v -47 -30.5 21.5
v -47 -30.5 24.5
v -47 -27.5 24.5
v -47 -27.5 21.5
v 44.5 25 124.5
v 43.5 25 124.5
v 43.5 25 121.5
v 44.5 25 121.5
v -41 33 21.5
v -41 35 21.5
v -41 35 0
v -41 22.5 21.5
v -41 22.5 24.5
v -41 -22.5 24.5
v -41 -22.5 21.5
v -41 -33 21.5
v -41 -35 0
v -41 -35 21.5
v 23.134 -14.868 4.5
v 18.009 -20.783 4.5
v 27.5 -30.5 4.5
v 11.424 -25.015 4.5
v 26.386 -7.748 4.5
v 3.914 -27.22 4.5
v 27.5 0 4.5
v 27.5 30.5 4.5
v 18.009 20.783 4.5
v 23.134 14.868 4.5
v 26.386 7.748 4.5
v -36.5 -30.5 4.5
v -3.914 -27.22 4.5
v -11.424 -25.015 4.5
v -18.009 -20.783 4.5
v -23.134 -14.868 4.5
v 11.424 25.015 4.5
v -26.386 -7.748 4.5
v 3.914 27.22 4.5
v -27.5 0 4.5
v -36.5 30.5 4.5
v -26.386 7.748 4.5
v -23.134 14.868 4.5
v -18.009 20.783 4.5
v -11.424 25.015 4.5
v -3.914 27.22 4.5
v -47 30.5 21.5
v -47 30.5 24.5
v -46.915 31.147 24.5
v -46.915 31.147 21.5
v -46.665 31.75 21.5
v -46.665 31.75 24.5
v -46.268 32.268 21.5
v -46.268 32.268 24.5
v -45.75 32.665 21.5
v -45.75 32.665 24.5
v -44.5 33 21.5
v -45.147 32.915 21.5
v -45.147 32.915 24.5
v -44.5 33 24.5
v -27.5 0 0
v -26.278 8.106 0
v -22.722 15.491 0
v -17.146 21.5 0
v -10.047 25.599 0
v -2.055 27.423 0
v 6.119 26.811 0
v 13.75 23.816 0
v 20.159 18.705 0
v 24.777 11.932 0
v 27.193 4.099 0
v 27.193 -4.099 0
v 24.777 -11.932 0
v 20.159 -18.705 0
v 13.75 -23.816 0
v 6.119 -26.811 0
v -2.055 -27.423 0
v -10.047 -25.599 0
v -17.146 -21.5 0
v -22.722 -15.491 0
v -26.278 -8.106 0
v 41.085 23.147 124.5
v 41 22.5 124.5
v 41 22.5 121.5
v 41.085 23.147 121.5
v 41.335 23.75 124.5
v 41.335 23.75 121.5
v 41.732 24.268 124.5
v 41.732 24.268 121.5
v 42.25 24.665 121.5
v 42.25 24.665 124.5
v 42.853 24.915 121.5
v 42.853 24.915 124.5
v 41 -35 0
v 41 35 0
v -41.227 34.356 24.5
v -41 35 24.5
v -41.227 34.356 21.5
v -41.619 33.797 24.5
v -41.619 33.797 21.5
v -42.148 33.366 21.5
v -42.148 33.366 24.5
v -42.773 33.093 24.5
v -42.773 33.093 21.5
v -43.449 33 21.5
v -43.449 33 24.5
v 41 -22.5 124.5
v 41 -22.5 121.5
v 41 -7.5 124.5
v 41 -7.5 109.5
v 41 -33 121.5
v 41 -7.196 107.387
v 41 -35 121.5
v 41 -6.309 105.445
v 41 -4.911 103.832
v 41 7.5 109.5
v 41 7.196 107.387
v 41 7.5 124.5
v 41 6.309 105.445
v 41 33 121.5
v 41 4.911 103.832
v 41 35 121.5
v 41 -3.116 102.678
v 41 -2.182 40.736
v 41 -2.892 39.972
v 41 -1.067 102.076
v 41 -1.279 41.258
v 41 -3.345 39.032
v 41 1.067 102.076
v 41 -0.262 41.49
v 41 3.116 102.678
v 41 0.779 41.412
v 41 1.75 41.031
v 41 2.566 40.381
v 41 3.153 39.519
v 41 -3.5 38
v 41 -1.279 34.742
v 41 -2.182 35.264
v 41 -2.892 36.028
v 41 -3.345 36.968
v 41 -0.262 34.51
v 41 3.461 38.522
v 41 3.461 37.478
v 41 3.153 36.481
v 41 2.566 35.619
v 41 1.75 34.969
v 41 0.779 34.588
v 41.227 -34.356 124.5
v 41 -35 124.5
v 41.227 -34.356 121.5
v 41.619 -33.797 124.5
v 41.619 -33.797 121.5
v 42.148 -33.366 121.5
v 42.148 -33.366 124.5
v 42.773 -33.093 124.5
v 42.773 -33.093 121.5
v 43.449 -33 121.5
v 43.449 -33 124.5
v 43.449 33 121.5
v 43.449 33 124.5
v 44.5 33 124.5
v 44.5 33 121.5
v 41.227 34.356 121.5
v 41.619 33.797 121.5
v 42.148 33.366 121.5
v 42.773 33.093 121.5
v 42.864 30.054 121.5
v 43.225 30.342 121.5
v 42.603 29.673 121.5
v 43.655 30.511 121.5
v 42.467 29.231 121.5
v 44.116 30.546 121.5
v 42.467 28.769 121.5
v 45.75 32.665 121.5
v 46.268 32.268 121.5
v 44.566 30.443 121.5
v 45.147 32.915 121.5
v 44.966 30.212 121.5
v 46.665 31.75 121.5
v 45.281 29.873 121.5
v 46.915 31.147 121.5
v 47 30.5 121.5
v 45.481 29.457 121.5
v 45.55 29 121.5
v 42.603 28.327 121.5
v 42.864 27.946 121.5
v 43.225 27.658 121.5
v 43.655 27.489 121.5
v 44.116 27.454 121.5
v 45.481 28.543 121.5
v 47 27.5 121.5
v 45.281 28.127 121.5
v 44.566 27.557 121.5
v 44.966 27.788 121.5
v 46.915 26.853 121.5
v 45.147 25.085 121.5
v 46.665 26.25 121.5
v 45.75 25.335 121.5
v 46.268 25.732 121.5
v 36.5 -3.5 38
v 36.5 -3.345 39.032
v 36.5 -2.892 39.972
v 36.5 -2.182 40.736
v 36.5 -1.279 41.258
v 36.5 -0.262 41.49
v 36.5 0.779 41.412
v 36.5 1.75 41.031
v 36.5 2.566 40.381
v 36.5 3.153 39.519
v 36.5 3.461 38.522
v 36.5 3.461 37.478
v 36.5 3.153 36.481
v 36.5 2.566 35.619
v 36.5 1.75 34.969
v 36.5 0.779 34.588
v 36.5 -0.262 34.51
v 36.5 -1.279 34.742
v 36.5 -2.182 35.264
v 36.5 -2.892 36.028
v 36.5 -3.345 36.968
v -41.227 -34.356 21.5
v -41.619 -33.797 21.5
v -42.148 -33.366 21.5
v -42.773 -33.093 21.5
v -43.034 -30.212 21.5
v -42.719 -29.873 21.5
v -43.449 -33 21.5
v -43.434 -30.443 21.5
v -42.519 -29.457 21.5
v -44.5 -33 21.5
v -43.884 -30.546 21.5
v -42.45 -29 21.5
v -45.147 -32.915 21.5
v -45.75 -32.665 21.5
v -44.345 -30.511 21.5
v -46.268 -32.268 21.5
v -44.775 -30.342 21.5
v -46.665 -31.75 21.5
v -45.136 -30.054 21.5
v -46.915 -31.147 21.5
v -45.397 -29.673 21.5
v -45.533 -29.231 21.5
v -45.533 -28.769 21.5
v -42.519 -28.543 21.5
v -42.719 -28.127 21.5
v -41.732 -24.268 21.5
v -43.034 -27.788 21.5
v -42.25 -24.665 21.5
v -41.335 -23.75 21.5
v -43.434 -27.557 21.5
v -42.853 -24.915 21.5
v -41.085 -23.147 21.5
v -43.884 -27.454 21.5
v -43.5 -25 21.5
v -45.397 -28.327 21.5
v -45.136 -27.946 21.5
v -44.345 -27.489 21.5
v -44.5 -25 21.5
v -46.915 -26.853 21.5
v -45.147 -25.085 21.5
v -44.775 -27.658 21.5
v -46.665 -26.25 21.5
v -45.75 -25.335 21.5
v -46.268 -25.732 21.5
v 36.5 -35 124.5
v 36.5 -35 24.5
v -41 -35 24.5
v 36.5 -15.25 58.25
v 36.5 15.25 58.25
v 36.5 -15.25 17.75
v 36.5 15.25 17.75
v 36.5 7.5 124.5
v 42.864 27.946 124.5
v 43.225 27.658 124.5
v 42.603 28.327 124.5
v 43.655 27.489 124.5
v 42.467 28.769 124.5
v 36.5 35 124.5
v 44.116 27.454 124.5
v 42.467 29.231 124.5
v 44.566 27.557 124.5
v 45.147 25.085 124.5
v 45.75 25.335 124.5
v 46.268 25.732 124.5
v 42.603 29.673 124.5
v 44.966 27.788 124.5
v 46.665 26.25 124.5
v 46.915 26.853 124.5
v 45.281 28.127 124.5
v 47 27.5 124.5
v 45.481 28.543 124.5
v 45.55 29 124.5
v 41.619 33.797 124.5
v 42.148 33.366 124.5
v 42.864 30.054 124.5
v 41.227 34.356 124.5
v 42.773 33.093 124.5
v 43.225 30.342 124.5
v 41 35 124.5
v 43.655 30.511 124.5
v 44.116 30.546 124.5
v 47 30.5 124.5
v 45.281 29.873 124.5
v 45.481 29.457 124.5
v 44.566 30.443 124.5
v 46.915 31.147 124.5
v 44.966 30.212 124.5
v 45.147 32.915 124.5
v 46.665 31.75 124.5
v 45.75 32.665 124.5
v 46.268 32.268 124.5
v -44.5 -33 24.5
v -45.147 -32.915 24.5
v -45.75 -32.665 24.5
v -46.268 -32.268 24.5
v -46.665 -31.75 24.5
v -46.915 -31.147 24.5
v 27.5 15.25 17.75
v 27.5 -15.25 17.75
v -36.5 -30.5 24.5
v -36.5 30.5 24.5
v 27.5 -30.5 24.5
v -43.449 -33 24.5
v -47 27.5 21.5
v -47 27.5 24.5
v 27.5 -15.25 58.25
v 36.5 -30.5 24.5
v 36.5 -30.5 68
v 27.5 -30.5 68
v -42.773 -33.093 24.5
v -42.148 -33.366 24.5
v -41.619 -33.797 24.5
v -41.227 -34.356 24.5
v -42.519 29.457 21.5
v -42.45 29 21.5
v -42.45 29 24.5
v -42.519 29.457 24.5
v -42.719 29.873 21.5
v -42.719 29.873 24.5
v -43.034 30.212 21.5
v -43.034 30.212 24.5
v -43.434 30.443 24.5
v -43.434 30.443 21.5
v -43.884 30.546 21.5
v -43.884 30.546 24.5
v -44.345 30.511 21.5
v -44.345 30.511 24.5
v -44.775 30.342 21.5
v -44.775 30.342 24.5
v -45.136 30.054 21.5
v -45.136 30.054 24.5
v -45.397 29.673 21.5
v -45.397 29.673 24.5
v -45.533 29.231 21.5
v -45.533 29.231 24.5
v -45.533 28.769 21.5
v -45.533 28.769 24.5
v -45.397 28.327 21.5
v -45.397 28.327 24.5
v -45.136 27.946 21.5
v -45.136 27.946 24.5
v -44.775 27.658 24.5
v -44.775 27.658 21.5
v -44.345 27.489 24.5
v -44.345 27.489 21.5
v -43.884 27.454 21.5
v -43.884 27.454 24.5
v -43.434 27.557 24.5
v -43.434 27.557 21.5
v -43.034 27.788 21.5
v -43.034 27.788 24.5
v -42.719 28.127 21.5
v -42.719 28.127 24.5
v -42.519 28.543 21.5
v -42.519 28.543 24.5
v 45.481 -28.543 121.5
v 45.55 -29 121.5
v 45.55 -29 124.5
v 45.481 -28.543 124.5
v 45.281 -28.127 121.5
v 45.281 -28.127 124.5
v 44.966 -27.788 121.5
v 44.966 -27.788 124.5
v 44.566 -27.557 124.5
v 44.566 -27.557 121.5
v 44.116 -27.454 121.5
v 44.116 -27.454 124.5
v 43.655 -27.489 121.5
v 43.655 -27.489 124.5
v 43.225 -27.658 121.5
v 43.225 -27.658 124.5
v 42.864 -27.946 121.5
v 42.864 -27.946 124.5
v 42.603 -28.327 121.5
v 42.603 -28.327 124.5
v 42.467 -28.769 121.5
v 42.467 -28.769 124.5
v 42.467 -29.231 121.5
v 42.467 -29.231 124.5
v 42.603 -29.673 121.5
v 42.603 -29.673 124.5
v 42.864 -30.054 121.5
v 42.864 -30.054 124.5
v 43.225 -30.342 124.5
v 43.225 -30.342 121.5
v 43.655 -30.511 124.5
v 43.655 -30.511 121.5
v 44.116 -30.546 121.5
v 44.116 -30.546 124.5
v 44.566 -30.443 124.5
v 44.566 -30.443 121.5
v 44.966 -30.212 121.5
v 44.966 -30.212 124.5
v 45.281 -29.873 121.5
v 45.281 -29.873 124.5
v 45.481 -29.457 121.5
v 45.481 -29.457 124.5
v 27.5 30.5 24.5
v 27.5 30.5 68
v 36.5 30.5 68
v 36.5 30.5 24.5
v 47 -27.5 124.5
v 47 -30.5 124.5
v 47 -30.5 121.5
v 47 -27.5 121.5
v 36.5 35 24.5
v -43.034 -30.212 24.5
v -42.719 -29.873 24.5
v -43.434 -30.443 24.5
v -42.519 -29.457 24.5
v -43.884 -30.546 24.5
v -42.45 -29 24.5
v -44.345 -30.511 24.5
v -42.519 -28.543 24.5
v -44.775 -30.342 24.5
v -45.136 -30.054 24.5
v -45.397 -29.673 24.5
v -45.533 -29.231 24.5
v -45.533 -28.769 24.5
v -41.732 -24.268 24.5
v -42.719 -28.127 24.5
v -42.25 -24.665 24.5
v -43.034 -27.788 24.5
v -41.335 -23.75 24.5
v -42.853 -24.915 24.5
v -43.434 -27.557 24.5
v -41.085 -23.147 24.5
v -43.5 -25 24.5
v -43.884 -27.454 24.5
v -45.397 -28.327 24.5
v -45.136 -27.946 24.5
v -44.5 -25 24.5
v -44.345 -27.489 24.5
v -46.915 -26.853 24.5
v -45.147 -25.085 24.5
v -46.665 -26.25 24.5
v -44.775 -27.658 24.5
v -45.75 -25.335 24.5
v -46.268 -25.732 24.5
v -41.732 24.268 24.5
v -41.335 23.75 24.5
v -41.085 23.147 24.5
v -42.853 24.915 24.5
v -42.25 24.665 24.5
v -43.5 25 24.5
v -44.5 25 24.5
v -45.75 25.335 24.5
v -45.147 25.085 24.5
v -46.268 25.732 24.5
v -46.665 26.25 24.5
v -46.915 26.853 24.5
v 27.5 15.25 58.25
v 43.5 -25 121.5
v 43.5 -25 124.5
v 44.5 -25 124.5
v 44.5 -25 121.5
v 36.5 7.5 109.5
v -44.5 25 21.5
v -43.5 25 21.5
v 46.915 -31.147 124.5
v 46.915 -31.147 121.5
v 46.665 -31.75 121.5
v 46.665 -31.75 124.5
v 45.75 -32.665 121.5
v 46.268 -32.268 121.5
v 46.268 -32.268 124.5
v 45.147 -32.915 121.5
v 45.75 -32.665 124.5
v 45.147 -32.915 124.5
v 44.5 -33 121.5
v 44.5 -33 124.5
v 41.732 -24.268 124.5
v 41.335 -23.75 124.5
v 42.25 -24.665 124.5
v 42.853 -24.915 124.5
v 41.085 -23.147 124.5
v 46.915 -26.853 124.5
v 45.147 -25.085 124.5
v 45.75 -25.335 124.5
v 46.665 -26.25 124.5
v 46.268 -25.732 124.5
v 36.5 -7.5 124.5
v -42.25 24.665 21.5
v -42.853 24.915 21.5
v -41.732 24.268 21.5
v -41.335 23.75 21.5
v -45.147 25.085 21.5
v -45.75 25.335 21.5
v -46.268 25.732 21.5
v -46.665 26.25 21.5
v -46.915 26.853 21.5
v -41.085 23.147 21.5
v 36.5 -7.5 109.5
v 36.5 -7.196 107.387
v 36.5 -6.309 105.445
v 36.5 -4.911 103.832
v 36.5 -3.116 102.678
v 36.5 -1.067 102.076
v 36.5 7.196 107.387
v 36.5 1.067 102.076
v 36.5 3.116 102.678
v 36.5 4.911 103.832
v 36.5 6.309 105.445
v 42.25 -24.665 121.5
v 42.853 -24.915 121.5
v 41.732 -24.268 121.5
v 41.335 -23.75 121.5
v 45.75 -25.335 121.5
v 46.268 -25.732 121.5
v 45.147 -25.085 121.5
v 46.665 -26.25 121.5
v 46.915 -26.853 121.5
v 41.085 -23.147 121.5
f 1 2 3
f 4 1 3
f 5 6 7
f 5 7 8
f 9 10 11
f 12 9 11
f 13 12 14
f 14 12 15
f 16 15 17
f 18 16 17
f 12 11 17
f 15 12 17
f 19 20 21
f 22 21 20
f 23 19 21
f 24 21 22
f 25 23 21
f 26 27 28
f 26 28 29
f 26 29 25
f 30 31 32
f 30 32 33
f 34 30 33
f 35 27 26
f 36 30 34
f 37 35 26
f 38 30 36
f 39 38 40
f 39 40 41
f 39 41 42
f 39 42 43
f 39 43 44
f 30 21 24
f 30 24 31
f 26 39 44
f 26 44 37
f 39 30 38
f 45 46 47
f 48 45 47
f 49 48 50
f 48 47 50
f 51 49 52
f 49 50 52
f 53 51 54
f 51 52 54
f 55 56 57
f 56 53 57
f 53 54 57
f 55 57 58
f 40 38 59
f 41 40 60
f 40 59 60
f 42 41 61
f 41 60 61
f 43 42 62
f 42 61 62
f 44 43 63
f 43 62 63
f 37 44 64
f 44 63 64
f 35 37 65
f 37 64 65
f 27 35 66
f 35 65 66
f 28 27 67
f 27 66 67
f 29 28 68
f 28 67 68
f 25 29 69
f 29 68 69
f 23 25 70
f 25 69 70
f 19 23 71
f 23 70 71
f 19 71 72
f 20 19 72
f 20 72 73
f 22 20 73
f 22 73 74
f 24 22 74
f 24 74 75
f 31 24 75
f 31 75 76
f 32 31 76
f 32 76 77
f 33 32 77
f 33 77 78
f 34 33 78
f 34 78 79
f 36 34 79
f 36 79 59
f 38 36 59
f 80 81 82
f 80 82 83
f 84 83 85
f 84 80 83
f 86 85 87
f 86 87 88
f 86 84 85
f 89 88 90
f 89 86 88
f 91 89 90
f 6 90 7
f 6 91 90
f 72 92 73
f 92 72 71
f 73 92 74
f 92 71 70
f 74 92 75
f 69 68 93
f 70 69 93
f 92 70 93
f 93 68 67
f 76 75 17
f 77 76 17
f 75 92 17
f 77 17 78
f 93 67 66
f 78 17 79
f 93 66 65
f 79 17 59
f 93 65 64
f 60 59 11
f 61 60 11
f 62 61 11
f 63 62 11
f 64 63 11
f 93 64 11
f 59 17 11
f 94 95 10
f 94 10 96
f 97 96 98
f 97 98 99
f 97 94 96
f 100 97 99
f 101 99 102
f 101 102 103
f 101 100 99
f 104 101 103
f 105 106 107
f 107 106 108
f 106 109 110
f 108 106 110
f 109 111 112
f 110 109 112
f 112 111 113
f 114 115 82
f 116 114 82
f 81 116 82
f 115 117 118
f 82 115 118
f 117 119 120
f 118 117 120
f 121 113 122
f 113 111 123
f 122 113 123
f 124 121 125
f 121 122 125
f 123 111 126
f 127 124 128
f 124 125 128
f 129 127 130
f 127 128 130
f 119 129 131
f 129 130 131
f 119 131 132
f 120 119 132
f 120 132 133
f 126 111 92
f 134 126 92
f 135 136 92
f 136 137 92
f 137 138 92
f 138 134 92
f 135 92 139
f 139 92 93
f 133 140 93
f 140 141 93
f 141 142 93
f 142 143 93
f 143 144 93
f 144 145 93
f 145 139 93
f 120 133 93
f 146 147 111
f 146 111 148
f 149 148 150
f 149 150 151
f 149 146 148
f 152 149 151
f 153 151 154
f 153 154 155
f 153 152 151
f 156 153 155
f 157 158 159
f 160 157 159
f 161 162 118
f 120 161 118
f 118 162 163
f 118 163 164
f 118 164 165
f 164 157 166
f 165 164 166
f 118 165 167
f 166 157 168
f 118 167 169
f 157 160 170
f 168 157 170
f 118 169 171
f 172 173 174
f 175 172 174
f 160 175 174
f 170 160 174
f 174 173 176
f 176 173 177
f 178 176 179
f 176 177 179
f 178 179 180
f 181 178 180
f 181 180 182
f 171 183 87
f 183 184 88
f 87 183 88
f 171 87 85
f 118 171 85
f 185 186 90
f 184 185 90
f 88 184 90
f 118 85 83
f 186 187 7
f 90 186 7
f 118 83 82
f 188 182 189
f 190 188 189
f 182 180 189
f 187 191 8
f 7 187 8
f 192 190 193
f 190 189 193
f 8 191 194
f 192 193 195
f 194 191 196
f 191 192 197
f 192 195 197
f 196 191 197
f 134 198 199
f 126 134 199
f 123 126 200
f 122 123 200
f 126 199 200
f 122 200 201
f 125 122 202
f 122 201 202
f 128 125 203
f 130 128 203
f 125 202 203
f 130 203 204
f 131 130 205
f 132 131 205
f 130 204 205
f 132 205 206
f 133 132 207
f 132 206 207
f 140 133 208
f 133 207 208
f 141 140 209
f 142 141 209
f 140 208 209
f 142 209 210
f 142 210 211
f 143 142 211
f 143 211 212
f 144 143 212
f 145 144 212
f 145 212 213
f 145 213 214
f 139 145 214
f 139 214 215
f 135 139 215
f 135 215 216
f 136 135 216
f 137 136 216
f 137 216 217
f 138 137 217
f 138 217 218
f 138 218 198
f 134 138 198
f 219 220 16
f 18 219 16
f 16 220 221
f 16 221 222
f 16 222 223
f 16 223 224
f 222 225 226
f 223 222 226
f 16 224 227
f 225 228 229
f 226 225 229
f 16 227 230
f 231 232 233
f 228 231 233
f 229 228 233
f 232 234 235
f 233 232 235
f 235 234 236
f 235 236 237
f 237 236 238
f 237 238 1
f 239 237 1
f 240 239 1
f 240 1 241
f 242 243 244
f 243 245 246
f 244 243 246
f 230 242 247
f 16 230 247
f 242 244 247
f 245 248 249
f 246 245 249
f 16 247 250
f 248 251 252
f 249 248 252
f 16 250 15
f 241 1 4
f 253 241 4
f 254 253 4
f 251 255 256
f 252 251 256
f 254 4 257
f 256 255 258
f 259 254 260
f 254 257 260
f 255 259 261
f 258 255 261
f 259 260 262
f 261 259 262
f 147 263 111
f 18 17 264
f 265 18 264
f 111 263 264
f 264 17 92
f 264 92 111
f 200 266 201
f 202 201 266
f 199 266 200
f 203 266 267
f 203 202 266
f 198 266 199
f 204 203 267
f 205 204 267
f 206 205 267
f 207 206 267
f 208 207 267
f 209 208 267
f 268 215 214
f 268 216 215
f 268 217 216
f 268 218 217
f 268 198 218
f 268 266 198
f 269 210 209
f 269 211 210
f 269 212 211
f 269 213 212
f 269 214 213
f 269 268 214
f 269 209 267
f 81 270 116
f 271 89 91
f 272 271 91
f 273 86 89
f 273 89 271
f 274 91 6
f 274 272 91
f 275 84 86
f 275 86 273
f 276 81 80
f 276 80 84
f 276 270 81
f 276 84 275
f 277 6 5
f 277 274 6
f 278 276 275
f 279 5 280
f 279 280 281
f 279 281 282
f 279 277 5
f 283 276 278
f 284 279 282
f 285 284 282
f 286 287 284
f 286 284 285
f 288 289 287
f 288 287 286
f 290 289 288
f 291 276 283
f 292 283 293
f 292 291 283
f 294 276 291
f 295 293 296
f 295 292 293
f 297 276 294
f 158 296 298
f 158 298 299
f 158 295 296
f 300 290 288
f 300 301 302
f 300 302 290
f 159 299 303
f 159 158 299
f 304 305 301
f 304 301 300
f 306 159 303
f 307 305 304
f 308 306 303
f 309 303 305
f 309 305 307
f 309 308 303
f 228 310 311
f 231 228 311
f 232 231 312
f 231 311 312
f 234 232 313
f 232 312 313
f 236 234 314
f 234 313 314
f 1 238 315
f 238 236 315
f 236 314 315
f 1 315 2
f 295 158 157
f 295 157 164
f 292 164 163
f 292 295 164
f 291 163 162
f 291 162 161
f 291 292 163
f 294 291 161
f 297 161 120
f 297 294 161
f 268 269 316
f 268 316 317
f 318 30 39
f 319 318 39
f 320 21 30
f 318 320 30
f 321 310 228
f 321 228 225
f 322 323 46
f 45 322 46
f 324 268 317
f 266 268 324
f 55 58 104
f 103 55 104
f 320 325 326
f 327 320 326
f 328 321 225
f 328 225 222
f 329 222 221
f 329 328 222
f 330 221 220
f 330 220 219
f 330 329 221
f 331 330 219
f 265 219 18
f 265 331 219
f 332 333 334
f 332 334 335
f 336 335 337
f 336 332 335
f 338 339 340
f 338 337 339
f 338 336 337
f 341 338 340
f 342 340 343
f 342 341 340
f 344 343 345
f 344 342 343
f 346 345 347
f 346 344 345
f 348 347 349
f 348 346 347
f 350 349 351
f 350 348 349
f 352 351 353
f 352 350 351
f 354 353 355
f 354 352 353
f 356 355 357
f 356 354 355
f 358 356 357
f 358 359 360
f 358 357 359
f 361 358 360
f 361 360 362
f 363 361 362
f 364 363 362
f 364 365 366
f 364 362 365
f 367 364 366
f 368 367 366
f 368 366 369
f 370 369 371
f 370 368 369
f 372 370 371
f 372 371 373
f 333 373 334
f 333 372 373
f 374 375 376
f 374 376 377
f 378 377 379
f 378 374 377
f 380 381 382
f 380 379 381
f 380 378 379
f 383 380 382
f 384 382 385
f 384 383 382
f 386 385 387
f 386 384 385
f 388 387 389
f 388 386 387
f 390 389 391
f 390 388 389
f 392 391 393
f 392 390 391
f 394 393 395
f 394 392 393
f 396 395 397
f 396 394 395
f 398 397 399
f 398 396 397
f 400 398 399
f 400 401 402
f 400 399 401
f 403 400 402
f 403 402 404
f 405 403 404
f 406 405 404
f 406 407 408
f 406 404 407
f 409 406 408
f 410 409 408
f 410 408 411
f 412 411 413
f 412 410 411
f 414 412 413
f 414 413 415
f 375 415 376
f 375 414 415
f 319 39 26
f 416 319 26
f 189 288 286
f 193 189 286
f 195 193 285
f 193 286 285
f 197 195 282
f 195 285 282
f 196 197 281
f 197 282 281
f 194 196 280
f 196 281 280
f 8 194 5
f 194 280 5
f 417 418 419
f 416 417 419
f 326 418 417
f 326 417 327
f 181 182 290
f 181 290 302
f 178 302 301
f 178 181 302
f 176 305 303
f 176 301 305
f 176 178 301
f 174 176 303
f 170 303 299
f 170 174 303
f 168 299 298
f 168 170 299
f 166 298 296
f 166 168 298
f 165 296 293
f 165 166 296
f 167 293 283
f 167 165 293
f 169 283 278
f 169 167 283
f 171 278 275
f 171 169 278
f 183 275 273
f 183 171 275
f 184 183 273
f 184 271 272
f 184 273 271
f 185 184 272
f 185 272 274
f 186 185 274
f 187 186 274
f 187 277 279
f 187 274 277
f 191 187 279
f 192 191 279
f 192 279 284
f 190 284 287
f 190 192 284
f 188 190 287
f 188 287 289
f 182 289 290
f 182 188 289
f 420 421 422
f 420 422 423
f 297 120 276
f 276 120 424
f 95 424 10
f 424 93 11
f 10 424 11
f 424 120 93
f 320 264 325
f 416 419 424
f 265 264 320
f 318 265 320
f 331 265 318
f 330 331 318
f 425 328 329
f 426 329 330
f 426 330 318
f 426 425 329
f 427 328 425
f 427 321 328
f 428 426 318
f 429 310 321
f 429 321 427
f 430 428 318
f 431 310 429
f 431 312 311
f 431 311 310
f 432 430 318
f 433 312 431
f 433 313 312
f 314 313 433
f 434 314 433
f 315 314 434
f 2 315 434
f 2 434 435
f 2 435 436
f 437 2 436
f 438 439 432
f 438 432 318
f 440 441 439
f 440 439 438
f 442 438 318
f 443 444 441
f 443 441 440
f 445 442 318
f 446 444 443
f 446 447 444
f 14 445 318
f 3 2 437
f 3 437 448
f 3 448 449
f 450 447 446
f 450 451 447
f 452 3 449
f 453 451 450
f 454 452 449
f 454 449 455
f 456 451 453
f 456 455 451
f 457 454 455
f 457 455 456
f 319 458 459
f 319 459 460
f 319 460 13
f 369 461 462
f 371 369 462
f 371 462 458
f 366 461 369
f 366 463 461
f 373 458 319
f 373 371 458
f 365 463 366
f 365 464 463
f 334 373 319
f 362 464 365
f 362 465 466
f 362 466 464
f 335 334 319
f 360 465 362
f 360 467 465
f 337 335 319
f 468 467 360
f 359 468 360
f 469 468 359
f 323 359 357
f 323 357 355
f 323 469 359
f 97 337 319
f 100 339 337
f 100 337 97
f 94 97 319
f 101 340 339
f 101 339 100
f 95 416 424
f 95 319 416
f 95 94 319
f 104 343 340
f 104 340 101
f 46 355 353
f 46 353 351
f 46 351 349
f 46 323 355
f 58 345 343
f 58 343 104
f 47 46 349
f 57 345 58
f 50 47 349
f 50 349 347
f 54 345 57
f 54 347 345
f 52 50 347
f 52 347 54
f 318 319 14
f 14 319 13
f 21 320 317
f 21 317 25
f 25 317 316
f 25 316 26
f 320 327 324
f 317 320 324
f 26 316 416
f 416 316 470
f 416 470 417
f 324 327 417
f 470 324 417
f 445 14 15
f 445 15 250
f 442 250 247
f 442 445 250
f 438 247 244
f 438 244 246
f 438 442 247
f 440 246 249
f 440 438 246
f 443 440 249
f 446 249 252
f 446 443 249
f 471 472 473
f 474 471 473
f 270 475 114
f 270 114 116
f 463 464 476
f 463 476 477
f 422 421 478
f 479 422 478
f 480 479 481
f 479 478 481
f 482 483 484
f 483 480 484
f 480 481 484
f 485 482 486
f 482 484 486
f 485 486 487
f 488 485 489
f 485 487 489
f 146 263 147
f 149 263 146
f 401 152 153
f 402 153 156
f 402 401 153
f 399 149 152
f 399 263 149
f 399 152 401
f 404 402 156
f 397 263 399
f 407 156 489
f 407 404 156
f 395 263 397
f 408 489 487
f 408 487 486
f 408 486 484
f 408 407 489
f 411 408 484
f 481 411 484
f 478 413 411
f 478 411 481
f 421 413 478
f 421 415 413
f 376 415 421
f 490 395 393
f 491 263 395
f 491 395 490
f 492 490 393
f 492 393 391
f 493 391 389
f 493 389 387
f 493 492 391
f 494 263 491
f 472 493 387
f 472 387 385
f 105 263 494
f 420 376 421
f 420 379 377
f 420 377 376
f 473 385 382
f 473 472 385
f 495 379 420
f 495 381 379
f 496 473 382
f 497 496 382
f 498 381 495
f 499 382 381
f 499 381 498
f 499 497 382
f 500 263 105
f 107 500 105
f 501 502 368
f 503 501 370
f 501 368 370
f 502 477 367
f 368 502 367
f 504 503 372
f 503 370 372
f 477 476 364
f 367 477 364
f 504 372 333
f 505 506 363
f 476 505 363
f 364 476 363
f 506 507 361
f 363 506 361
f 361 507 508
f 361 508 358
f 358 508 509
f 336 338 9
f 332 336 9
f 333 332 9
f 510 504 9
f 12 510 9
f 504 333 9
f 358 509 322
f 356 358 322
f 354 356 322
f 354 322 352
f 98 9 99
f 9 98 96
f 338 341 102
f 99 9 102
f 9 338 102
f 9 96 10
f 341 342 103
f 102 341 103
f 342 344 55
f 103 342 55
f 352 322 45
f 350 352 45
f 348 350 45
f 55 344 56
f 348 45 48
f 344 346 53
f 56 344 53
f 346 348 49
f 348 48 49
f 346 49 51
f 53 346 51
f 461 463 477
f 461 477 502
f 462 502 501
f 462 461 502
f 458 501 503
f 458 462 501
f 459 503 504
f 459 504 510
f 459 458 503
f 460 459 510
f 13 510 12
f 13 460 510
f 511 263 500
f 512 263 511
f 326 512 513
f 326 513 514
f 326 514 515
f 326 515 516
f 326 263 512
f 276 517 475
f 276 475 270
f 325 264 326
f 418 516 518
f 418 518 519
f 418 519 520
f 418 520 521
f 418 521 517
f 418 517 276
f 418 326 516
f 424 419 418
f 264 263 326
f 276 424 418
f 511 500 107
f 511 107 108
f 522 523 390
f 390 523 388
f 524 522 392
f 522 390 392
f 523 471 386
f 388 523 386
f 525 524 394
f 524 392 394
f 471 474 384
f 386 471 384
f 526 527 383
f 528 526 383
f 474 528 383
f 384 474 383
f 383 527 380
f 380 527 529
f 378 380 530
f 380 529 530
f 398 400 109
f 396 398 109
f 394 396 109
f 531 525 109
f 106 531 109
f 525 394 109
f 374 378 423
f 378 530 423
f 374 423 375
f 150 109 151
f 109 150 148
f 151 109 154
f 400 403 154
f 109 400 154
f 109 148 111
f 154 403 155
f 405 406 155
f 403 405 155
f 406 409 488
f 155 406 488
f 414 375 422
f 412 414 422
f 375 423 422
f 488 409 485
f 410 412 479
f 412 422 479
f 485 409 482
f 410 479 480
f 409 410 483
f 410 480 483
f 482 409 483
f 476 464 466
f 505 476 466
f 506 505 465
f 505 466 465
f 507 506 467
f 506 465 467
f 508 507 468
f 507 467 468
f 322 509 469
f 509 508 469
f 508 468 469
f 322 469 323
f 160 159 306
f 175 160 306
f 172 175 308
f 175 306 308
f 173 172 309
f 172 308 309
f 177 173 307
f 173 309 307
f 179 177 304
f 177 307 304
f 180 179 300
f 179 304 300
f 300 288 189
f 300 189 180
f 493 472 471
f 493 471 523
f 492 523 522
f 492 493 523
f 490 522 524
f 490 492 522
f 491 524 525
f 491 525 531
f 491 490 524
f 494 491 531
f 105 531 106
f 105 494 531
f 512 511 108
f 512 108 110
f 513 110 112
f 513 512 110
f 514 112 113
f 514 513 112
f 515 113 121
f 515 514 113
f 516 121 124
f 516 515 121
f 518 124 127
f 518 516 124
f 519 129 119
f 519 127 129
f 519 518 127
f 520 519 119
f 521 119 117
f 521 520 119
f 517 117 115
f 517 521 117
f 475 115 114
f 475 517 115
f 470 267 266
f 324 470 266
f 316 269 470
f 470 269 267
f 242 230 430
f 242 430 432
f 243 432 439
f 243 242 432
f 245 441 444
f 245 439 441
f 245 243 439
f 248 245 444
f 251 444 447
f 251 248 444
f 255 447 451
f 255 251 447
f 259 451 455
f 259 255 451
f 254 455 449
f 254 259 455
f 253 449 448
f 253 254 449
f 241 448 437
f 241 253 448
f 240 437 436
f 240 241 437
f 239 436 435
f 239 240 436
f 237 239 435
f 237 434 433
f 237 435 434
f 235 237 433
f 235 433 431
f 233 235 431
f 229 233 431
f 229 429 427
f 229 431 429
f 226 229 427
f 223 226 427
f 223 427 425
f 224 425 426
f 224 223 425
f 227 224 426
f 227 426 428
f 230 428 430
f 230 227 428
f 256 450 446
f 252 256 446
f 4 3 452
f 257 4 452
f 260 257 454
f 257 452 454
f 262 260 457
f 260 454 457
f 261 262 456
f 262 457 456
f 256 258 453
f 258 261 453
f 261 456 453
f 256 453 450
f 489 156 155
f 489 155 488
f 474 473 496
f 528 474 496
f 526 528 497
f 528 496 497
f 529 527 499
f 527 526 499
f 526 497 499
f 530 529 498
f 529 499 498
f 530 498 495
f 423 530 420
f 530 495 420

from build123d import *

# Parameters (mm, degrees)
SKETCH1_W               = 70
SKETCH1_H               = 82
BOSS_EXTRUDE1_DEPTH     = 4.5
SKETCH2_W               = 4.5
SKETCH2_H               = 70
BOSS_EXTRUDE2_DEPTH     = 120
BOSS_EXTRUDE3_DEPTH     = 20
CUT_EXTRUDE1_REACH      = 137.67
SKETCH4_R               = 27.5
CUT_EXTRUDE2_REACH      = 152.77
SKETCH5_R               = 3.5
SKETCH6_W               = 6
SKETCH6_H               = 8
BOSS_EXTRUDE4_DEPTH     = 3
SKETCH7_W               = 6
SKETCH7_H               = 8
BOSS_EXTRUDE5_DEPTH     = 3
CUT_EXTRUDE4_DEPTH      = 116.905133622
CUT_EXTRUDE4_DEPTH_BACK = 116.905133622
SKETCH8_R               = 1.55
FILLET1_R               = 2.5
SKETCH9_W               = 30.5
SKETCH9_H               = 40.5
BOSS_EXTRUDE6_DEPTH     = 9


with BuildPart() as part:
    # Sketch1 → Boss-Extrude1 (new body)
    with BuildSketch(Plane(origin=(0, 0, 0), x_dir=(0, 1, 0), z_dir=(0, 0, 1))):
        Rectangle(SKETCH1_W, SKETCH1_H)
    extrude(amount=BOSS_EXTRUDE1_DEPTH)

    # Sketch2 → Boss-Extrude2 (add)
    with BuildSketch(Plane.XY.offset(4.5)):
        with Locations((38.75, 0)):
            Rectangle(SKETCH2_W, SKETCH2_H)
    extrude(amount=BOSS_EXTRUDE2_DEPTH)

    # Sketch3 → Boss-Extrude3 (add)
    with BuildSketch(Plane.XY.offset(4.5)):
        Polygon((36.5, 35), (-41, 35), (-41, -35), (36.5, -35), (36.5, -30.5), (-36.5, -30.5), (-36.5, 30.5), (36.5, 30.5), align=None)
    extrude(amount=BOSS_EXTRUDE3_DEPTH)

    # Sketch4 → Cut-Extrude1 (cut, up to next)
    with BuildSketch(Plane(origin=(0, 0, 0), x_dir=(1, 0, 0), z_dir=(0, 0, -1)), mode=Mode.PRIVATE) as cut_extrude1_sk1:
        with Locations(Location((0, 0, 0), (0, 0, 180))):
            Circle(SKETCH4_R)
    cut_extrude1_tool1 = extrude(cut_extrude1_sk1.sketch, amount=-CUT_EXTRUDE1_REACH, mode=Mode.PRIVATE) & part.part
    add(cut_extrude1_tool1.solids().sort_by_distance((0, 0, 0))[0], mode=Mode.SUBTRACT)

    # Sketch5 → Cut-Extrude2 (cut, up to next)
    with BuildSketch(Plane(origin=(36.5, 0, 0), x_dir=(0, -1, 0), z_dir=(-1, 0, 0)), mode=Mode.PRIVATE) as cut_extrude2_sk1:
        with Locations((0, 38)):
            Circle(SKETCH5_R)
    cut_extrude2_tool1 = extrude(cut_extrude2_sk1.sketch, amount=-CUT_EXTRUDE2_REACH, mode=Mode.PRIVATE) & part.part
    # Sketch5 → Cut-Extrude2 (cut, up to next)
    with BuildSketch(Plane(origin=(36.5, 0, 0), x_dir=(0, -1, 0), z_dir=(-1, 0, 0)), mode=Mode.PRIVATE) as cut_extrude2_sk2:
        with BuildLine():
            Line((-7.5, 124.5), (7.5, 124.5))
            Line((7.5, 124.5), (7.5, 109.5))
            ThreePointArc((7.5, 109.5), (0, 102), (-7.5, 109.5))
            Line((-7.5, 109.5), (-7.5, 124.5))
        make_face()
    cut_extrude2_tool2 = extrude(cut_extrude2_sk2.sketch, amount=-CUT_EXTRUDE2_REACH, mode=Mode.PRIVATE) & part.part
    add(cut_extrude2_tool1.solids().sort_by_distance((36.5, 0, 38))[0], mode=Mode.SUBTRACT)
    add(cut_extrude2_tool2.solids().sort_by_distance((36.5, 0, 113.987689))[0], mode=Mode.SUBTRACT)

    # Sketch6 → Boss-Extrude4 (add)
    with BuildSketch(Plane.XY.offset(124.5)):
        with Locations((44, 29)):
            Rectangle(SKETCH6_W, SKETCH6_H)
        with Locations((44, -29)):
            Rectangle(SKETCH6_W, SKETCH6_H)
    extrude(amount=-BOSS_EXTRUDE4_DEPTH)

    # Sketch7 → Boss-Extrude5 (add)
    with BuildSketch(Plane.XY.offset(24.5)):
        with Locations((-44, -29)):
            Rectangle(SKETCH7_W, SKETCH7_H)
        with Locations((-44, 29)):
            Rectangle(SKETCH7_W, SKETCH7_H)
    extrude(amount=-BOSS_EXTRUDE5_DEPTH)

    # Sketch8 → Cut-Extrude4 (cut, two sides: drawn at the far end of the back side and taken through both)
    with BuildSketch(Plane.XY.offset(24.5).offset(-CUT_EXTRUDE4_DEPTH_BACK)):
        with Locations((-44, 29)):
            Circle(SKETCH8_R)
        with Locations((44, 29)):
            Circle(SKETCH8_R)
        with Locations((44, -29)):
            Circle(SKETCH8_R)
        with Locations((-44, -29)):
            Circle(SKETCH8_R)
    extrude(amount=CUT_EXTRUDE4_DEPTH + CUT_EXTRUDE4_DEPTH_BACK, mode=Mode.SUBTRACT)

    # Fillet1
    # the kernel refuses this fillet: 2.5 mm, written as the material it adds along each edge
    with BuildSketch(Plane(origin=(-41, 33, 24.5), x_dir=(-1.5774048733869181e-12, 1.0, 0), z_dir=(0, 0, -1)), Plane(origin=(41, -33, 124.5), x_dir=(1.5312195955625318e-12, -1.0, 0), z_dir=(0, 0, -1))) as fillet1_piece_1:
        with BuildLine():
            CenterArc((2.5, -2.449489743), FILLET1_R, 101.536959033, 78.463040967)
            Line((0, -2.449489743), (0, 0))
            Line((0, 0), (2, 0))
        make_face()
    extrude(amount=3)
    with BuildSketch(Plane(origin=(-41, 25, 24.5), x_dir=(0, -1, 0), z_dir=(0, 0, -1)), Plane(origin=(41, -25, 124.5), x_dir=(0, 1, 0), z_dir=(0, 0, -1))) as fillet1_piece_2:
        with BuildLine():
            CenterArc((FILLET1_R, FILLET1_R), FILLET1_R, 180, 90)
            Line((0, FILLET1_R), (0, 0))
            Line((0, 0), (FILLET1_R, 0))
        make_face()
    extrude(amount=3)
    with BuildSketch(Plane(origin=(-41, -25, 24.5), x_dir=(0, 1, 0), z_dir=(0, 0, -1)), Plane(origin=(41, 25, 124.5), x_dir=(0, -1, 0), z_dir=(0, 0, -1))) as fillet1_piece_3:
        with BuildLine():
            CenterArc((FILLET1_R, -FILLET1_R), FILLET1_R, 90, 90)
            Line((0, -FILLET1_R), (0, 0))
            Line((0, 0), (FILLET1_R, 0))
        make_face()
    extrude(amount=3)
    with BuildSketch(Plane(origin=(-41, -33, 24.5), x_dir=(-1.6022738691384966e-12, -1.0, 0), z_dir=(0, 0, -1)), Plane(origin=(41, 33, 124.5), x_dir=(1.4885870314169656e-12, 1.0, 0), z_dir=(0, 0, -1))) as fillet1_piece_4:
        with BuildLine():
            CenterArc((2.5, 2.449489743), FILLET1_R, 180, 78.463040967)
            Line((0, 2.449489743), (0, 0))
            Line((0, 0), (2, 0))
        make_face()
    extrude(amount=3)
    # the kernel refuses this fillet: 2.5 mm, written as the material it takes off along each edge
    with BuildSketch(Plane(origin=(-47, 25, 30.75), x_dir=(1, 0, 0), z_dir=(0, 0, -1)), Plane(origin=(-47, 33, 30.75), x_dir=(0, -1, 0), z_dir=(0, 0, -1)), Plane(origin=(-47, -33, 30.75), x_dir=(1, 0, 0), z_dir=(0, 0, -1)), Plane(origin=(-47, -25, 30.75), x_dir=(0, -1, 0), z_dir=(0, 0, -1)), Plane(origin=(47, 33, 130.75), x_dir=(-1, 0, 0), z_dir=(0, 0, -1)), Plane(origin=(47, 25, 130.75), x_dir=(0, 1, 0), z_dir=(0, 0, -1))) as fillet1_2_piece_1:
        with BuildLine():
            CenterArc((FILLET1_R, -FILLET1_R), FILLET1_R, 90, 90)
            Line((0, -FILLET1_R), (0, 0))
            Line((0, 0), (FILLET1_R, 0))
        make_face()
    extrude(amount=15.5, mode=Mode.SUBTRACT)
    with BuildSketch(Plane(origin=(47, -25, 130.75), x_dir=(0, -1, 0), z_dir=(0, 0, -1)), Plane(origin=(47, -33, 130.75), x_dir=(-1, 0, 0), z_dir=(0, 0, -1))) as fillet1_2_piece_2:
        with BuildLine():
            CenterArc((FILLET1_R, FILLET1_R), FILLET1_R, 180, 90)
            Line((0, FILLET1_R), (0, 0))
            Line((0, 0), (FILLET1_R, 0))
        make_face()
    extrude(amount=15.5, mode=Mode.SUBTRACT)

    # Sketch9 → Boss-Extrude6 (add)
    with BuildSketch(Plane(origin=(36.5, 0, 0), x_dir=(0, -1, 0), z_dir=(-1, 0, 0))):
        Polygon((-30.5, 24.5), (-30.5, 68), (30.5, 68), (30.5, 24.5), (30.5, 4.5), (-30.5, 4.5), align=None)
        with Locations((0, 38)):
            Rectangle(SKETCH9_W, SKETCH9_H, mode=Mode.SUBTRACT)
    extrude(amount=BOSS_EXTRUDE6_DEPTH)


solid = part.part
